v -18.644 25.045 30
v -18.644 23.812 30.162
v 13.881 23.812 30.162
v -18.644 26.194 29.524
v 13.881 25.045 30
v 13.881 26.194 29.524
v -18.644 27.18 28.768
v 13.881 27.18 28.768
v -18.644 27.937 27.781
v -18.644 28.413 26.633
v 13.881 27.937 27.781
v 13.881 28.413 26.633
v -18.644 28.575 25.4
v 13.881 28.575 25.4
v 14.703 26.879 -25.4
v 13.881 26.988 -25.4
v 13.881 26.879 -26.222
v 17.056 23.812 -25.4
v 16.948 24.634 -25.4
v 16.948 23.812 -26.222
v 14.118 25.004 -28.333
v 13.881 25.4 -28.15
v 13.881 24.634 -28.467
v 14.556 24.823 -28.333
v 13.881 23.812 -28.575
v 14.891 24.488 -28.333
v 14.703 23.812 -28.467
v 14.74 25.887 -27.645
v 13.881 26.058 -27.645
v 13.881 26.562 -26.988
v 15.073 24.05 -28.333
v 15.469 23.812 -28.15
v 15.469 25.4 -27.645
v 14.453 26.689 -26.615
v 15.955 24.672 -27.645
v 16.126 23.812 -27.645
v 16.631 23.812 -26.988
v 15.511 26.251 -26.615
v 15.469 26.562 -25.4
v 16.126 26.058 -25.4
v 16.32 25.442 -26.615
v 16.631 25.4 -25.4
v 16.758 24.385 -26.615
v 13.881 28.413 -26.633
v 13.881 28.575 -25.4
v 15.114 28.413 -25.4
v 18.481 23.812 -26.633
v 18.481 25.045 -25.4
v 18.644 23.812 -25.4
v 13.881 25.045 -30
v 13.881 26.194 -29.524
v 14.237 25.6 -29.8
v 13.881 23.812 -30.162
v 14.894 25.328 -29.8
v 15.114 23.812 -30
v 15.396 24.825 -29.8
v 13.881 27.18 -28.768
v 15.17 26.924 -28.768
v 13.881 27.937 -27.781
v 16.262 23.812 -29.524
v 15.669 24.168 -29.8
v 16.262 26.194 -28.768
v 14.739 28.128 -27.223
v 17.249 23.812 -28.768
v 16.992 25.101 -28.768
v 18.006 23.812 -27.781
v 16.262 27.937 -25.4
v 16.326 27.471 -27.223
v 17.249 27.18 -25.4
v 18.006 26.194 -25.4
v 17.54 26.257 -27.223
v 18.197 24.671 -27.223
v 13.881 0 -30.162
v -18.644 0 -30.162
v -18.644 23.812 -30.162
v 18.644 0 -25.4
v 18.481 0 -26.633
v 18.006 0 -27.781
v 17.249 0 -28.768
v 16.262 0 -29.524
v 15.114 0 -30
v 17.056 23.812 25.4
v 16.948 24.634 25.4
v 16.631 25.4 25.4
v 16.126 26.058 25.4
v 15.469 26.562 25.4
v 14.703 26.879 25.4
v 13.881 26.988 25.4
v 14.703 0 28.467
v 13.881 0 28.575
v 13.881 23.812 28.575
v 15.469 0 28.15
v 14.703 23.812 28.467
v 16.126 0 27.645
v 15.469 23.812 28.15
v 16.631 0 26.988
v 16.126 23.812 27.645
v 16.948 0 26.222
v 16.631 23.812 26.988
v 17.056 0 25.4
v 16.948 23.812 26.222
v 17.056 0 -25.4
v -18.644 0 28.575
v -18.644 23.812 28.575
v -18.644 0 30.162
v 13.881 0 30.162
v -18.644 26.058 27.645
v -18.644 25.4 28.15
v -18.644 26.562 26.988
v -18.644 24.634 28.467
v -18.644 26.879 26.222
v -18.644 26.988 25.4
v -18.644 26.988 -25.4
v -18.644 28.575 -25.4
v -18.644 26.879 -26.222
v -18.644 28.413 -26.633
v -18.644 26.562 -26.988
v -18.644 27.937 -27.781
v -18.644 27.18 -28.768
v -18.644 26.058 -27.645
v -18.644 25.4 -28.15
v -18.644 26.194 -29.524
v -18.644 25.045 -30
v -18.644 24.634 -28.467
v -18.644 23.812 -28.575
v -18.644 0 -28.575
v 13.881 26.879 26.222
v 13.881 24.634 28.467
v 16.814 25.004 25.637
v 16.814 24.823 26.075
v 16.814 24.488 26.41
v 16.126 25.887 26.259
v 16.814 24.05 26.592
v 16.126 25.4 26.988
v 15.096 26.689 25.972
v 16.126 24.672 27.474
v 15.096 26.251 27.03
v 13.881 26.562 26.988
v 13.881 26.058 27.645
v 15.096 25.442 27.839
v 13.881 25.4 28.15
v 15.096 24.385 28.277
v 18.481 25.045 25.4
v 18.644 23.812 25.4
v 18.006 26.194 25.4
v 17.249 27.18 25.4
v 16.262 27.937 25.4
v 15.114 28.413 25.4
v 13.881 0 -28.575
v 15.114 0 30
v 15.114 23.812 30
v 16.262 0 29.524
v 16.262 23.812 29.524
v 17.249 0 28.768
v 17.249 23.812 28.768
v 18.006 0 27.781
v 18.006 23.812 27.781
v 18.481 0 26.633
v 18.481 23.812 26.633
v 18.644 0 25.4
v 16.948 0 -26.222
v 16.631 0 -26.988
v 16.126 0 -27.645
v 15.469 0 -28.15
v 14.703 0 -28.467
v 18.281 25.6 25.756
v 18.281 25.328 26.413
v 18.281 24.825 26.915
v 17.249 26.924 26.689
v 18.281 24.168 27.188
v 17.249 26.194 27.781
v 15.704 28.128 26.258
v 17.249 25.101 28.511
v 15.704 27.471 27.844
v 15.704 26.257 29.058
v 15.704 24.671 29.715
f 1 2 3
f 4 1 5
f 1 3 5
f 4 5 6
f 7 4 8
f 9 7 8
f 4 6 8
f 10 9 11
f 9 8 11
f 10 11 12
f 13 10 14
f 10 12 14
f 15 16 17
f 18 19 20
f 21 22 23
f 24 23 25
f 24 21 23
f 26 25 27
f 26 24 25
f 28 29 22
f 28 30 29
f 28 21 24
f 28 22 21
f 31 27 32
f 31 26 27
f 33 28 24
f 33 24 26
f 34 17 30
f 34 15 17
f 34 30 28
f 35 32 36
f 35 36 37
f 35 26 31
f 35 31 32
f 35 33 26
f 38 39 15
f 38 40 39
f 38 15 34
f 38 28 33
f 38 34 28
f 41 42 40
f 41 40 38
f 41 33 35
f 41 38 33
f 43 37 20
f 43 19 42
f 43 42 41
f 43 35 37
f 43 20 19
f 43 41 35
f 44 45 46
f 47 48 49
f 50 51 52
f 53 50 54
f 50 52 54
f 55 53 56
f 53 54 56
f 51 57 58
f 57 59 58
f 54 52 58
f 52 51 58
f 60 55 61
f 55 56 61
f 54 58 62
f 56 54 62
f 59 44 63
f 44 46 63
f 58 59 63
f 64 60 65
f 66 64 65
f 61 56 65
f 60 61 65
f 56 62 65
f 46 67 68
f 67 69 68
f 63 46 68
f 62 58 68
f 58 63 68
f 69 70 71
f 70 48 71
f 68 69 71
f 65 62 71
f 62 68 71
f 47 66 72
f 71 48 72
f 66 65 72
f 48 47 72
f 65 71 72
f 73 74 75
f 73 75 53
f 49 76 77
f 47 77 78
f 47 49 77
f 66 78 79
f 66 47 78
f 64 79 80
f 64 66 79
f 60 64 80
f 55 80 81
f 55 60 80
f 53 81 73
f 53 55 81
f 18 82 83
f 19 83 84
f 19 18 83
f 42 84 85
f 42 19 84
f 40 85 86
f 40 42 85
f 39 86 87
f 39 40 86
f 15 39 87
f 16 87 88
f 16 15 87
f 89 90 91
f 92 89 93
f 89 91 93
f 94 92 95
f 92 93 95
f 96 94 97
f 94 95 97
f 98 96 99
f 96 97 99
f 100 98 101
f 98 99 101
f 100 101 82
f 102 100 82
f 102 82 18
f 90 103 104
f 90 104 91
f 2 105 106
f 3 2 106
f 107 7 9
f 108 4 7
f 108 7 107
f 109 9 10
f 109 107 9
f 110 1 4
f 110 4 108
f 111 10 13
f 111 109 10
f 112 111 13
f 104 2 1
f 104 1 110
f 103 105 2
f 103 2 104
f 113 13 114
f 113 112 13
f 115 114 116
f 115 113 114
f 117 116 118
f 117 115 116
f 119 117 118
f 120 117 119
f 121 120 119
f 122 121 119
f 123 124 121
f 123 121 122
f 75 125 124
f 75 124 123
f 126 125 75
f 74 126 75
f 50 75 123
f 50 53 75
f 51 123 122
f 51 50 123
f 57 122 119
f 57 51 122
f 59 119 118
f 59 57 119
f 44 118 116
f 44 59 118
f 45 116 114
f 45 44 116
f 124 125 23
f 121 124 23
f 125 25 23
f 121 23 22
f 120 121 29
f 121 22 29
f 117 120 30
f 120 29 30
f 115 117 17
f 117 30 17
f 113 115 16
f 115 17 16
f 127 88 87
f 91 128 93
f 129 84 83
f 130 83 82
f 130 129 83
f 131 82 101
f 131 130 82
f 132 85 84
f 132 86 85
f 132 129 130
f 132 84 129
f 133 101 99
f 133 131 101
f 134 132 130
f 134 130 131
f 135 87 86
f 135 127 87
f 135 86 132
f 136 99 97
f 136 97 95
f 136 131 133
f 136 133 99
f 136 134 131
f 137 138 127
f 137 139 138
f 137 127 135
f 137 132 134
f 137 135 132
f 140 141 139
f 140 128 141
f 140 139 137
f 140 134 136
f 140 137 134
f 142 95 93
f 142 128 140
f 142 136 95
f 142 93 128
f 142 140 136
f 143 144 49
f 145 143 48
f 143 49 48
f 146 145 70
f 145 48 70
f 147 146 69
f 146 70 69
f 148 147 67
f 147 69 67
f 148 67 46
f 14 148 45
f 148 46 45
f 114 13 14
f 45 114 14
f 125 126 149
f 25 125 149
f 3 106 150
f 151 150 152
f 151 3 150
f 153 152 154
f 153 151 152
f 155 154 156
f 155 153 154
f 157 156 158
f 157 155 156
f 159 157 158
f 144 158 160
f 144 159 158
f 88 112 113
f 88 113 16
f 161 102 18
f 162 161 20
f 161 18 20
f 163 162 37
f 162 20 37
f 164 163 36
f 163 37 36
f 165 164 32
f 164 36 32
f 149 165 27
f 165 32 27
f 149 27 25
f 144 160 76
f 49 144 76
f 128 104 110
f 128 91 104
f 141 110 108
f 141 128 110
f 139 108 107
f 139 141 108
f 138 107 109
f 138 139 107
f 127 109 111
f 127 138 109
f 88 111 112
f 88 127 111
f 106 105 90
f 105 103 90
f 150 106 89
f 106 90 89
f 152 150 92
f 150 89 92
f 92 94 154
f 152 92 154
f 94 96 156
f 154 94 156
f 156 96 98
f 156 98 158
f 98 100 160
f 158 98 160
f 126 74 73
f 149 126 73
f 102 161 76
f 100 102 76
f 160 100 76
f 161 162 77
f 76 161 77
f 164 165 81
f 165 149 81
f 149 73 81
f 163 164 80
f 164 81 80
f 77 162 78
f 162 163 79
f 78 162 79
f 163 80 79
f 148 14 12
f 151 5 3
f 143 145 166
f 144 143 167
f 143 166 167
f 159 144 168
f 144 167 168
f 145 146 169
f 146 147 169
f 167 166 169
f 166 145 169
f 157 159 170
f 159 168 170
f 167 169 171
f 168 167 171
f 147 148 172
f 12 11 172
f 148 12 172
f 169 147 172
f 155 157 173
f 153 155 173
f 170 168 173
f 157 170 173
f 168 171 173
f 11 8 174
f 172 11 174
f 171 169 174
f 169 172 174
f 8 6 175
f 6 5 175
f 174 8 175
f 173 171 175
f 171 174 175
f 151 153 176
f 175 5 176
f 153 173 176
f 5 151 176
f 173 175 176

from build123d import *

# Parameters (mm, degrees)
SKETCH1_W           = 37.2872
SKETCH1_H           = 60.325
BOSS_EXTRUDE1_DEPTH = 28.575
FILLET1_R           = 4.7625
SHELL1_T            = -1.5875


with BuildPart() as part:
    # Sketch1 → Boss-Extrude1 (new body)
    with BuildSketch(Plane(origin=(0, 0, 0), x_dir=(1, 0, 0), z_dir=(0, 1, 0))):
        Rectangle(SKETCH1_W, SKETCH1_H)
    extrude(amount=BOSS_EXTRUDE1_DEPTH)

    # Fillet1
    fillet1_edges = [part.edges().sort_by_distance(p)[0] for p in [
        (0, 28.575, 30.1625),
        (18.6436, 28.575, 0),
        (0, 28.575, -30.1625),
        (18.6436, 14.2875, 30.1625),
        (18.6436, 14.2875, -30.1625),
    ]]
    fillet(fillet1_edges, radius=FILLET1_R)

    # Shell1
    shell1_openings = [part.faces().sort_by_distance(p)[0] for p in [
        (-0.076414213, 0, 0),
        (-18.6436, 14.212396054, 0),
    ]]
    offset(amount=SHELL1_T, openings=shell1_openings, kind=Kind.INTERSECTION)


solid = part.part
